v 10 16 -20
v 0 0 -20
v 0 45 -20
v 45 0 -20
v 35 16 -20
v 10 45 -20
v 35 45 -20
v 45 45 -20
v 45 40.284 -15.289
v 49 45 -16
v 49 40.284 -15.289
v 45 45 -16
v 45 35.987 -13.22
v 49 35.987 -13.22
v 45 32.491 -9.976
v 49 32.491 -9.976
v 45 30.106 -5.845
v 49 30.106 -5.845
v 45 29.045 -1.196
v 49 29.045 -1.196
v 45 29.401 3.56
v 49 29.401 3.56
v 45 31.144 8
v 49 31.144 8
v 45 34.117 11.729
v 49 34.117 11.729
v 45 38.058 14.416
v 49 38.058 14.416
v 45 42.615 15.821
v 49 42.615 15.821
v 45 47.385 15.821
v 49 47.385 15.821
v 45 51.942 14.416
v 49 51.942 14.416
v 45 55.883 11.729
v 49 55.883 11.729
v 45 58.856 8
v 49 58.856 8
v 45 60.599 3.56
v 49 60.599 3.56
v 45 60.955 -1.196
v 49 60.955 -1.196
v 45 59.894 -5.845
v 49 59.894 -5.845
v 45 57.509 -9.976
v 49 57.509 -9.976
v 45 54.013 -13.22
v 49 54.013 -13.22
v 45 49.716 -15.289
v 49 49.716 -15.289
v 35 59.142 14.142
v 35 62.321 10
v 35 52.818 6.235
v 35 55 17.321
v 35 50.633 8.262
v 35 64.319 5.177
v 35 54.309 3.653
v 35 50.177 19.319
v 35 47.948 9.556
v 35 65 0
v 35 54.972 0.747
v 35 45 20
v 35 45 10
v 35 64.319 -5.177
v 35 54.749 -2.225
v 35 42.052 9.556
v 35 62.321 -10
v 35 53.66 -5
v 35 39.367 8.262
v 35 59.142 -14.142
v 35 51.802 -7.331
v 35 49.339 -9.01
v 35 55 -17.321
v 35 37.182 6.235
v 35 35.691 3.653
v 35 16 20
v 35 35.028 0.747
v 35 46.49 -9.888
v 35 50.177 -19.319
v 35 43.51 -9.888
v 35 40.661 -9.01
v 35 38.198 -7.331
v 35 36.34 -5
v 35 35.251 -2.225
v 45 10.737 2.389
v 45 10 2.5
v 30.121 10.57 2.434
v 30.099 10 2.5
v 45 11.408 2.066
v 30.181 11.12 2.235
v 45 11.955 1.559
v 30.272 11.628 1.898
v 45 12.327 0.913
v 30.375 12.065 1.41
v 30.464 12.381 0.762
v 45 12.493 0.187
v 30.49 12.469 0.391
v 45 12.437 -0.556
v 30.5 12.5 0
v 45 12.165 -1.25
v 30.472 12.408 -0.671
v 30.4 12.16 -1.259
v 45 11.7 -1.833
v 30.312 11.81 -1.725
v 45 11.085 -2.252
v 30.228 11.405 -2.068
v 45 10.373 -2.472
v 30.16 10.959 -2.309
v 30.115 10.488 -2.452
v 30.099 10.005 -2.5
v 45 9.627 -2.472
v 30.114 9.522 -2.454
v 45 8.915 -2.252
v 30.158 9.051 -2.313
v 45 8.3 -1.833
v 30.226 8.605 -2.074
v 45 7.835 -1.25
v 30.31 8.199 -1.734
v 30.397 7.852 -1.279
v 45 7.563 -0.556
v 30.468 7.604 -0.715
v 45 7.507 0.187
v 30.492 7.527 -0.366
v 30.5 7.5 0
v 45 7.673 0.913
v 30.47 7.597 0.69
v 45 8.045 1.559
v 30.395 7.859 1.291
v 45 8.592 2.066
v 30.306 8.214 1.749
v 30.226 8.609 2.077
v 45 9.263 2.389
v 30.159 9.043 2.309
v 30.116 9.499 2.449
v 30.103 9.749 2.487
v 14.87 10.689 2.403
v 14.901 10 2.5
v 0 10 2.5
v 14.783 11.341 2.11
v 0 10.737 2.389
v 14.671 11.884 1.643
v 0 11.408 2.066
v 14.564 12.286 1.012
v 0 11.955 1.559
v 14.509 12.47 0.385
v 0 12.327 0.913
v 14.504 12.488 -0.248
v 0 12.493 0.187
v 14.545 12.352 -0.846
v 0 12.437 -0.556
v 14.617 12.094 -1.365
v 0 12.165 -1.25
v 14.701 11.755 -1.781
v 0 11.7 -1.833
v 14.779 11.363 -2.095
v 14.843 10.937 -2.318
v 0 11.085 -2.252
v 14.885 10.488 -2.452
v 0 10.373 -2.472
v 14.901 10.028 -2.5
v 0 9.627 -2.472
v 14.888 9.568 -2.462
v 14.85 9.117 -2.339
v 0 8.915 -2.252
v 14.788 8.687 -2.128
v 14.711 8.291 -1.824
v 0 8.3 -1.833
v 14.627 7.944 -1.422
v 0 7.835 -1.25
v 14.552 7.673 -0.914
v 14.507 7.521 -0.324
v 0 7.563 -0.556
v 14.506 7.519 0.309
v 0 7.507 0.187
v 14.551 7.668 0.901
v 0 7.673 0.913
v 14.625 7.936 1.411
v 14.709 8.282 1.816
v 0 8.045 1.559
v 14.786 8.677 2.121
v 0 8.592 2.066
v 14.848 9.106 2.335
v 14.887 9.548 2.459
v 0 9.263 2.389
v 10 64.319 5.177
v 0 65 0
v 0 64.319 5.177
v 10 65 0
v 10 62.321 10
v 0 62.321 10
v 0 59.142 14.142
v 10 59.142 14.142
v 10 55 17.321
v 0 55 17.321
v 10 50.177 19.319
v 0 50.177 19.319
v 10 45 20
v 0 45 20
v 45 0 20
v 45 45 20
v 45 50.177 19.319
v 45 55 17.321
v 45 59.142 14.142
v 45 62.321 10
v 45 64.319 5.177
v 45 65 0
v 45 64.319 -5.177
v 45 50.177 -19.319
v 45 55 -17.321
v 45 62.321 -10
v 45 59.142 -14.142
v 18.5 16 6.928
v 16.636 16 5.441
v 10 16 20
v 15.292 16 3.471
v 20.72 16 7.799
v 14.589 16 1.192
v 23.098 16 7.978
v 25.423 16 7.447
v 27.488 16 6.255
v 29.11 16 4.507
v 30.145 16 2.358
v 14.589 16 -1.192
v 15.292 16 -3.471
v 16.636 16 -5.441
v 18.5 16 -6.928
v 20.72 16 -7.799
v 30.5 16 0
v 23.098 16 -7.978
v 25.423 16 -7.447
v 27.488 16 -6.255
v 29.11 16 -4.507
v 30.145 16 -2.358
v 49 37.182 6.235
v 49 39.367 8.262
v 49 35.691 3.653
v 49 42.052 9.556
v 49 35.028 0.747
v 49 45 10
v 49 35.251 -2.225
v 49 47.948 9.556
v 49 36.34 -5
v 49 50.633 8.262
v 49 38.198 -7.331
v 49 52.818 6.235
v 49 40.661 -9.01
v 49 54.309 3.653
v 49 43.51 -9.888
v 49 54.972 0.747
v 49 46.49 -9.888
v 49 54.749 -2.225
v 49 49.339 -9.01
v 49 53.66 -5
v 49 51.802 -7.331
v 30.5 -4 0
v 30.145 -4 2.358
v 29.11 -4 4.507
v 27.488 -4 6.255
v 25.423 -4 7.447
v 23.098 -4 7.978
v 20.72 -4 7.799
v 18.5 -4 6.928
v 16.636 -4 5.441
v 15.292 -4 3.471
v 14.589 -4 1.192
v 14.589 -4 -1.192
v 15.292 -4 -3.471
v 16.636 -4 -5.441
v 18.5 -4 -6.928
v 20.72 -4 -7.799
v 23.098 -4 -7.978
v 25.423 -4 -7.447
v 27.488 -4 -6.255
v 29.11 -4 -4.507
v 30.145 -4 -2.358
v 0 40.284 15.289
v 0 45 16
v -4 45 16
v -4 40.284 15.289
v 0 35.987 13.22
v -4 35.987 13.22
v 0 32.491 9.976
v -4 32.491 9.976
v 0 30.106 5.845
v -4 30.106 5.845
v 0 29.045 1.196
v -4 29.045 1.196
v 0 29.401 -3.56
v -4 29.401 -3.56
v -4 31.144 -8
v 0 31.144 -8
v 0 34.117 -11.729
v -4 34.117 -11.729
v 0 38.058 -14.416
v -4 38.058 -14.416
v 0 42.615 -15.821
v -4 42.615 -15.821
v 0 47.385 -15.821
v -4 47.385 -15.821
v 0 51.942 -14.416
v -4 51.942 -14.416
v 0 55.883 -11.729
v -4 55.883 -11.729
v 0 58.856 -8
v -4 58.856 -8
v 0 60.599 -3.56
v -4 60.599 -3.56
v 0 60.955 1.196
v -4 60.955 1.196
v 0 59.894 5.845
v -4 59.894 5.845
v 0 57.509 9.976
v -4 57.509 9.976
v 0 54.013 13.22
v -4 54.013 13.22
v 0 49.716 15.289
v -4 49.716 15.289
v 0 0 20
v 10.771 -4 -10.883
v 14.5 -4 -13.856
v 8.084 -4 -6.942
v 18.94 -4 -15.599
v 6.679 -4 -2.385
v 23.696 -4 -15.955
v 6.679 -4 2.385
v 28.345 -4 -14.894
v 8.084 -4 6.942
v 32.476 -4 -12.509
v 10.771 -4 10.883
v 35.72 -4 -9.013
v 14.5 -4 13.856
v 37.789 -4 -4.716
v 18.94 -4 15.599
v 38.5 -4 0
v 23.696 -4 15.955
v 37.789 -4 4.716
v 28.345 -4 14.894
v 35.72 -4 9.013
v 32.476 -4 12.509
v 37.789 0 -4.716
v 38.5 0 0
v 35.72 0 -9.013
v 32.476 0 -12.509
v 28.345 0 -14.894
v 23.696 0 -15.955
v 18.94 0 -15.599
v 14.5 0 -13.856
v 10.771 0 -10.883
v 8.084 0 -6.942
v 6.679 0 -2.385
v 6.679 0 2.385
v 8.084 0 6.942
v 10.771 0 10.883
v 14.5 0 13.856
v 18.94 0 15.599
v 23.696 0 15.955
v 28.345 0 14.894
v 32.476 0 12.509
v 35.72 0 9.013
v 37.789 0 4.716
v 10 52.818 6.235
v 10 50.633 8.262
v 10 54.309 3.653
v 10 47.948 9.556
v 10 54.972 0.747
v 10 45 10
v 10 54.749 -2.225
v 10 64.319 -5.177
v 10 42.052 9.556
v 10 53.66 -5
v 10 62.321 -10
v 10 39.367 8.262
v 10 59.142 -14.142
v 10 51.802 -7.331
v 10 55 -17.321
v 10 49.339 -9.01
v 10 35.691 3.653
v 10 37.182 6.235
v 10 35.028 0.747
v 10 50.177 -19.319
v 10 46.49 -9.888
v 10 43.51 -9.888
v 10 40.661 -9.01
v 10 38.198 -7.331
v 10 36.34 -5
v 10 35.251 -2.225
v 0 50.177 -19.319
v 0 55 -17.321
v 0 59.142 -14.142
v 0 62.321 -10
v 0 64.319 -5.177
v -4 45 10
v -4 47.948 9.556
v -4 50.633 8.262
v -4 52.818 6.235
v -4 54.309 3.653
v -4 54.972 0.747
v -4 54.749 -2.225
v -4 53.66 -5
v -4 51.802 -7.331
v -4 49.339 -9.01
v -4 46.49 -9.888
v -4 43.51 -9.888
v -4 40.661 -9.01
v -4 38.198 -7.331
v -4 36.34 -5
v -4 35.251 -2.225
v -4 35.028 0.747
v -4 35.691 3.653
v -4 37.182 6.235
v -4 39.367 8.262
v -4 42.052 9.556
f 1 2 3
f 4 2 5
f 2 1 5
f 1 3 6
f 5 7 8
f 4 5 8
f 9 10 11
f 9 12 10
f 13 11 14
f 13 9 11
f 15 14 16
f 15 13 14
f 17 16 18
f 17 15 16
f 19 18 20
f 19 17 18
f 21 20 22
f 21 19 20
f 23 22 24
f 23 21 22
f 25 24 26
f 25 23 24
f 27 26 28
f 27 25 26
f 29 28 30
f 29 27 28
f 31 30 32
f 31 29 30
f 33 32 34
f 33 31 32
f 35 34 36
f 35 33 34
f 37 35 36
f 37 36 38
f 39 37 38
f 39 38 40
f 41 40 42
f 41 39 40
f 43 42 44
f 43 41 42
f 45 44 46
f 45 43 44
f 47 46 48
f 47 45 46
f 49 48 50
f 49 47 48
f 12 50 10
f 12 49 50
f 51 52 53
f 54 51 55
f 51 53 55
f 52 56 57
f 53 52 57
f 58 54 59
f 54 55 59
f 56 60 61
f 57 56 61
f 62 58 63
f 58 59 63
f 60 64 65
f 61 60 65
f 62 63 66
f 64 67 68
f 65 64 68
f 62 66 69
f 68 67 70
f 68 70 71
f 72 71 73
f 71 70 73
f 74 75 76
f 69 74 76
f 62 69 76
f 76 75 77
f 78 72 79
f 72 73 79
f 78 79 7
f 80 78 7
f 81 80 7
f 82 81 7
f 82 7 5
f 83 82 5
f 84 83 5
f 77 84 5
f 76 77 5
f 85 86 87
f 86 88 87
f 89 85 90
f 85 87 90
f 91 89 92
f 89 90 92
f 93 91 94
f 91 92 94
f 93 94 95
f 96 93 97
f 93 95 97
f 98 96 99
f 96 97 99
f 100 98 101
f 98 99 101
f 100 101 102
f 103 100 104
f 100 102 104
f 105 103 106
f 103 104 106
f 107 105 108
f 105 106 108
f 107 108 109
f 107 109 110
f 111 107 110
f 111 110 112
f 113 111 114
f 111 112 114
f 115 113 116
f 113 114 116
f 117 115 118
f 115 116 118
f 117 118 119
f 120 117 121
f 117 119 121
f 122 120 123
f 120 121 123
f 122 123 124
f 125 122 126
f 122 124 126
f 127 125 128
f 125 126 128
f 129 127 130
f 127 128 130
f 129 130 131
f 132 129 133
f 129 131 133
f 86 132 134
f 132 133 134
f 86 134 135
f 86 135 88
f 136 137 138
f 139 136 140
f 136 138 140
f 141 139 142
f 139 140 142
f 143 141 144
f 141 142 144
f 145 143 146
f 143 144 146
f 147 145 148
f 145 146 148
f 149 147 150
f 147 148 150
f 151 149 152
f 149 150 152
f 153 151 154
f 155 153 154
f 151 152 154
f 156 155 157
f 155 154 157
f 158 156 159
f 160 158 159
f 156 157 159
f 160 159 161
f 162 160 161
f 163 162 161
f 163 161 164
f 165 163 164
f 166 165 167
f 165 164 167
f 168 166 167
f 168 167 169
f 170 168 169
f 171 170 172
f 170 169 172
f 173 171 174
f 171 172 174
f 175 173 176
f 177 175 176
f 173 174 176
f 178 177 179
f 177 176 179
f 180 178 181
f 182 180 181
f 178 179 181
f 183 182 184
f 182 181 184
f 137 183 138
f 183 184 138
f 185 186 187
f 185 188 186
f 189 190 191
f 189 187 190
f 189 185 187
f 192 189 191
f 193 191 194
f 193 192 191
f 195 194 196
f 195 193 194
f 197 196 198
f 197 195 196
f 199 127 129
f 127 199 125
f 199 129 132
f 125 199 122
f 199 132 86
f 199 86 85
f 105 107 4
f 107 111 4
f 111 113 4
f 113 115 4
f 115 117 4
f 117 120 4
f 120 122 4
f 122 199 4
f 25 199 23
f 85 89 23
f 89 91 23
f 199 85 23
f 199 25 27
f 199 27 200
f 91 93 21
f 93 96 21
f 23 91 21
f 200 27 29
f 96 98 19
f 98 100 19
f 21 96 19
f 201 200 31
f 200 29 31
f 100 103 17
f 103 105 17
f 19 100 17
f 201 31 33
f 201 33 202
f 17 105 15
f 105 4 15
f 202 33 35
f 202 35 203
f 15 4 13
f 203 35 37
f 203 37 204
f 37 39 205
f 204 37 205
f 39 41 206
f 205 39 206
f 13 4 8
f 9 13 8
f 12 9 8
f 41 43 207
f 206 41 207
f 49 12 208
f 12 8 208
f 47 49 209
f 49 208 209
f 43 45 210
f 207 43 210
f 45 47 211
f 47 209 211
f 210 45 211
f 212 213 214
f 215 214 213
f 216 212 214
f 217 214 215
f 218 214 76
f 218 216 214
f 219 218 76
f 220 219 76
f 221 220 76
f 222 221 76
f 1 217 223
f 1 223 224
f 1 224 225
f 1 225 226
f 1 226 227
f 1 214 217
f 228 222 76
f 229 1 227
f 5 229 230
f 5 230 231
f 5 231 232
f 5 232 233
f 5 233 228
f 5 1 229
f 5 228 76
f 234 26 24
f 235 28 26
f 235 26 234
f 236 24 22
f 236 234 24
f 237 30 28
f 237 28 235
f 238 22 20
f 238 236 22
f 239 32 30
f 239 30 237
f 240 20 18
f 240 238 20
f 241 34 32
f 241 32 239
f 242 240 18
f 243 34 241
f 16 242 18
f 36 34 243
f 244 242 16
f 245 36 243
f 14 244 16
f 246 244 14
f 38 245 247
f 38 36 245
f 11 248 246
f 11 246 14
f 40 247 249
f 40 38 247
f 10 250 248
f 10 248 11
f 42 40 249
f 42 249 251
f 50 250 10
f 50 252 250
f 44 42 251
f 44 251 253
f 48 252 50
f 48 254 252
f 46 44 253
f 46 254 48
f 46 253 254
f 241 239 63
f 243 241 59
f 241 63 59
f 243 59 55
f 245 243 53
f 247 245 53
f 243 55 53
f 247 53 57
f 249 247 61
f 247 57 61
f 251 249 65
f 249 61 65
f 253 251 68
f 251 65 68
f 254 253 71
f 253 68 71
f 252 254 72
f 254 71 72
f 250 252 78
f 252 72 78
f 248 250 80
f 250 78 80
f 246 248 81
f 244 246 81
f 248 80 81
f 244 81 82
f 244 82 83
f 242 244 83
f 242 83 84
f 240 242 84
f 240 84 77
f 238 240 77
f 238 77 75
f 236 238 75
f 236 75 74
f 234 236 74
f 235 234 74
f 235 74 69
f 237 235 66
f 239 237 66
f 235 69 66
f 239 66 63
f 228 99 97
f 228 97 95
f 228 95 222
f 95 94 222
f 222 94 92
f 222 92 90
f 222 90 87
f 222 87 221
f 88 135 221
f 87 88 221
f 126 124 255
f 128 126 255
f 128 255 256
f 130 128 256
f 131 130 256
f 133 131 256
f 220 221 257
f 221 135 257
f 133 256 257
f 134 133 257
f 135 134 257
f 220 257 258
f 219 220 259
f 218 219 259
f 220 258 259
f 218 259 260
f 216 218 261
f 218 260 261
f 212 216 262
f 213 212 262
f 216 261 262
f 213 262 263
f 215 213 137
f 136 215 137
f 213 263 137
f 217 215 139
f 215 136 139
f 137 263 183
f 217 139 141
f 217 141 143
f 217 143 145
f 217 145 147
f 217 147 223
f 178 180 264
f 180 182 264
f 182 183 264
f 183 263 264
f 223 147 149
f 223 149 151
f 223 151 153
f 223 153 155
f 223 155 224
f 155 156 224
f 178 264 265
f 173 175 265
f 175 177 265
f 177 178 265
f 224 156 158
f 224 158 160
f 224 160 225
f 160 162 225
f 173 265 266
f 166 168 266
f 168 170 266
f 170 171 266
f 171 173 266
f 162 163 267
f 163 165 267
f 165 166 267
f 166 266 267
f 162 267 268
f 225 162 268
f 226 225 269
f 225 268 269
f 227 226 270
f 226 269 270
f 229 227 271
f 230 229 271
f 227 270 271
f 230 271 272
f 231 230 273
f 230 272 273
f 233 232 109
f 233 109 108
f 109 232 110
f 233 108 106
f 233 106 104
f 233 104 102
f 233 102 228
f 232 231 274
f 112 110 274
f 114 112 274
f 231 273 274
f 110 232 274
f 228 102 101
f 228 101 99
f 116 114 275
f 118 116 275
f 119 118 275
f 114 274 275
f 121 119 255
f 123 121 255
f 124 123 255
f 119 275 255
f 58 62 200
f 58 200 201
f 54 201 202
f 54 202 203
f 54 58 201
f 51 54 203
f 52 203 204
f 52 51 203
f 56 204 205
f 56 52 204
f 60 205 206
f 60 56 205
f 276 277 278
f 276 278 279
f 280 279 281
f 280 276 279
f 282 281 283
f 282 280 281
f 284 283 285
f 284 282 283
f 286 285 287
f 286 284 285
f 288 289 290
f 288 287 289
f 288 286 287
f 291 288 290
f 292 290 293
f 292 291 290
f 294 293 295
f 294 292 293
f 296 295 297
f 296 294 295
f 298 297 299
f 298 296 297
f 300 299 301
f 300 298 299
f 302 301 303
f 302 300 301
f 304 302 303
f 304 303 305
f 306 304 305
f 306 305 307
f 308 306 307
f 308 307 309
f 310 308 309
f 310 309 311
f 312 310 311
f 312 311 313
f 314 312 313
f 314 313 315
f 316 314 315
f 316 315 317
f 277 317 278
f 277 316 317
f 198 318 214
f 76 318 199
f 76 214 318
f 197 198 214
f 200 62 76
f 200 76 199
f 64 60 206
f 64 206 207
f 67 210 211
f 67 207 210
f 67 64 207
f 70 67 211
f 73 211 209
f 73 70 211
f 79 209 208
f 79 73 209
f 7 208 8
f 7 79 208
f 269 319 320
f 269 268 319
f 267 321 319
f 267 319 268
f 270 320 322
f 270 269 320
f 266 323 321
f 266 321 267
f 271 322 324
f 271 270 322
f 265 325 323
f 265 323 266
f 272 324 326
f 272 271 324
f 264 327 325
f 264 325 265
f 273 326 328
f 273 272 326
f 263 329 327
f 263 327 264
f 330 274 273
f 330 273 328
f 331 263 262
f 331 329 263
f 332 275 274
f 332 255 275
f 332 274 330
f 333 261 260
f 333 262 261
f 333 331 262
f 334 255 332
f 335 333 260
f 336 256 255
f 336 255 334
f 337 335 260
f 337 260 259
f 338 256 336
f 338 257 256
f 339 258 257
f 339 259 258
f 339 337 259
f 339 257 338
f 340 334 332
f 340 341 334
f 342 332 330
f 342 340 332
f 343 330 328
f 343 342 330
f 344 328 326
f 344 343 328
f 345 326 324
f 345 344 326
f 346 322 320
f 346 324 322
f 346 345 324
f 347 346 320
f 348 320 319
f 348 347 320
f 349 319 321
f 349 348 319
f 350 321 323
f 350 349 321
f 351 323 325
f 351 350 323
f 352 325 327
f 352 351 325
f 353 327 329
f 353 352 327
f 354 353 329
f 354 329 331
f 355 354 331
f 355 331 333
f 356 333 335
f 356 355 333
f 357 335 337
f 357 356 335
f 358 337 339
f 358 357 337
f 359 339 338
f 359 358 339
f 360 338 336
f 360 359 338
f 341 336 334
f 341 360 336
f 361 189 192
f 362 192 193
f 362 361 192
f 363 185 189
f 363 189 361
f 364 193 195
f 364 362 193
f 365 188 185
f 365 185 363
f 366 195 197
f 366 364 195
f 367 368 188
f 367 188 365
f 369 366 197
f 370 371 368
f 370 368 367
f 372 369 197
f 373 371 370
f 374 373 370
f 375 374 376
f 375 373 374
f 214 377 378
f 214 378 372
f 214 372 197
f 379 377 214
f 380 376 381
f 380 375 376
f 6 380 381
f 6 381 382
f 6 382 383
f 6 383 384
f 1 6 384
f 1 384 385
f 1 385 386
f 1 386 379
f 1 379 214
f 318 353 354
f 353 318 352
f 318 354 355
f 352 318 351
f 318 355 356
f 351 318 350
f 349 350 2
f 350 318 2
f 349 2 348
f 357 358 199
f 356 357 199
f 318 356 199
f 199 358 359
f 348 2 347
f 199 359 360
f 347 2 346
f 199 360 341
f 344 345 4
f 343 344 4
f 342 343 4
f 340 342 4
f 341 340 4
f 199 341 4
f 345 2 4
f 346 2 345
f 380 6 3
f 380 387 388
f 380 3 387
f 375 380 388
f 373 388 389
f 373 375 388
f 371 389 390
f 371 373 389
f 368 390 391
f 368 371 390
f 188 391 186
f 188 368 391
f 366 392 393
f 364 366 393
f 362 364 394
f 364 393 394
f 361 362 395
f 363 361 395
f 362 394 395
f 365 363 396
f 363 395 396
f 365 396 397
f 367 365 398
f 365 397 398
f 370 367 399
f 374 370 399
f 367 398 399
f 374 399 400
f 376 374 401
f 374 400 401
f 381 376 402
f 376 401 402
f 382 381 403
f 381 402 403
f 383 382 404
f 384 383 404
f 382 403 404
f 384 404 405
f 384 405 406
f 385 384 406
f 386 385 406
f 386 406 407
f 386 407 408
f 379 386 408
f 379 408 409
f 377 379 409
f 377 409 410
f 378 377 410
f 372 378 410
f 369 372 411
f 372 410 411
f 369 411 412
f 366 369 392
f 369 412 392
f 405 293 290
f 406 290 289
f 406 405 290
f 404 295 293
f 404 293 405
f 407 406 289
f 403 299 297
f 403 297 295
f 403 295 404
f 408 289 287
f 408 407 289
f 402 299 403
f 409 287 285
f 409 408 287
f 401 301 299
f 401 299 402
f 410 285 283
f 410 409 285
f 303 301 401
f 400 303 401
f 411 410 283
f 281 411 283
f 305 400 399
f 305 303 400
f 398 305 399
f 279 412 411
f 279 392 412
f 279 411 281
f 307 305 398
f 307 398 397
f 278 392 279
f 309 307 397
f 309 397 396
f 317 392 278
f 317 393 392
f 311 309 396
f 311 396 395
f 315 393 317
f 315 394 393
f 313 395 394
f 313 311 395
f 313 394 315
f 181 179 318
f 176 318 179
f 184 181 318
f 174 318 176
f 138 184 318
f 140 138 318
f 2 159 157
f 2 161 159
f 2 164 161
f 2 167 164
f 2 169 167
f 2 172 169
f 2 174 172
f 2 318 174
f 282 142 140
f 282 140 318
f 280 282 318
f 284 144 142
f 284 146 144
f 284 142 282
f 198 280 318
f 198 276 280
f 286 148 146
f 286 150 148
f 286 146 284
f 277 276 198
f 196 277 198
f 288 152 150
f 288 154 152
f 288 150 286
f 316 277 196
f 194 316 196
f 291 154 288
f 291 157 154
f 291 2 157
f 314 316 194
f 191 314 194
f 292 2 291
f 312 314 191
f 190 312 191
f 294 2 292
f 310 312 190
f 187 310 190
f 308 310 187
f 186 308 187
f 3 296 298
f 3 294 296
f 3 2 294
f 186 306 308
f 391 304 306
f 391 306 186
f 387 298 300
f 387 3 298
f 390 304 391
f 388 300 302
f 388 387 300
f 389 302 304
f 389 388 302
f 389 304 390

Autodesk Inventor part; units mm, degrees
ref_plane "YZ Plane" through (0, 0, 0) normal (1, 0, 0) x (0, 1, 0)
ref_plane "XZ Plane" through (0, 0, 0) normal (0, 1, 0) x (-1, 0, 0)
ref_plane "XY Plane" through (0, 0, 0) normal (0, 0, 1) x (1, 0, 0)
sketch "Sketch1" plane through (0, 0, 0) normal (0, 0, 1) x (1, 0, 0)
  line L0 (0, 0) -> (45, 0)
  line L1 (0, 0) -> (0, 65)
  line L2 (0, 65) -> (10, 65)
  line L3 (10, 65) -> (10, 16)
  line L4 (10, 16) -> (22.5, 16)
  line L5 (22.5, 71) -> (22.5, -20)
  line L6 (45, 0) -> (45, 65)
  line L7 (45, 65) -> (35, 65)
  line L8 (35, 65) -> (35, 16)
  line L9 (35, 16) -> (22.5, 16)
  dimension "d1" = 45
  dimension "d2" = 65
  dimension "d3" = 10
  dimension "d4" = 16
  dimension "d5" = 22.5
extrude "Extrusion1" add sketch "Sketch1" along normal mid plane 40
sketch "Sketch2" plane through (0, 0, 20) normal (0, -1, 0) x (1, 0, 0)
  circle A0 centre (22.5, -20) radius 16
  line L0 (0, 0) -> (45, 0) projected
  line L1 (0, -40) -> (0, 0) projected
  point P0 (0, -20)
  dimension "d8" = 32
  dimension "d9" = 20
  dimension "d10" = 22.5
extrude "Extrusion2" add sketch "Sketch2" along normal blind 4
fillet "Fillet1" radius 20 4 edges at (5, 65, -20) (5, 65, 20) (40, 65, 20) (40, 65, -20)
sketch "Sketch3" plane through (22.5, -4, 0) normal (0, -1, 0) x (1, 0, 0)
  circle A0 centre (0, 0) radius 16 projected
  circle A1 centre (0, 0) radius 8
  point P0 (-22.5, 0)
  dimension "d14" = 16
extrude "Extrusion3" cut sketch "Sketch3" against normal through all contours A1
sketch "Sketch4" plane through (0, 0, -20) normal (-1, 0, 0) x (0, 0, 1)
  circle A0 centre (20, 45) radius 16
  line L0 (4, -4) -> (36, -4) projected
  line L1 (40, 45) -> (40, 0) projected
  point P0 (20, 0)
  dimension "d17" = 32
  dimension "d18" = 49
  dimension "d19" = 20
extrude "Extrusion4" add sketch "Sketch4" along normal blind 4
sketch "Sketch5" plane through (45, 0, 20) normal (1, 0, 0) x (0, 0, -1)
  circle A0 centre (20, 45) radius 16
  line L0 (4, -4) -> (36, -4) projected
  line L1 (0, 0) -> (0, 45) projected
  point P0 (20, 0)
  dimension "d22" = 32
  dimension "d23" = 49
  dimension "d24" = 20
extrude "Extrusion5" add sketch "Sketch5" along normal blind 4
sketch "Sketch6" plane through (-4, 45, 0) normal (-1, 0, 0) x (0, 0, 1)
  circle A0 centre (0, 0) radius 16 projected
  circle A1 centre (0, 0) radius 10
  circle A2 centre (0, -35) radius 2.5
  line L0 (-20, -45) -> (20, -45) projected
  line L1 (-20, -45) -> (-20, 0) projected
  point P0 (0, -45)
  dimension "d27" = 20
  dimension "d28" = 5
  dimension "d29" = 10
  dimension "d30" = 20
extrude "Extrusion6" cut sketch "Sketch6" against normal through all contours A1 | A2
equation "\"d5\" = 0.5 * d1"
